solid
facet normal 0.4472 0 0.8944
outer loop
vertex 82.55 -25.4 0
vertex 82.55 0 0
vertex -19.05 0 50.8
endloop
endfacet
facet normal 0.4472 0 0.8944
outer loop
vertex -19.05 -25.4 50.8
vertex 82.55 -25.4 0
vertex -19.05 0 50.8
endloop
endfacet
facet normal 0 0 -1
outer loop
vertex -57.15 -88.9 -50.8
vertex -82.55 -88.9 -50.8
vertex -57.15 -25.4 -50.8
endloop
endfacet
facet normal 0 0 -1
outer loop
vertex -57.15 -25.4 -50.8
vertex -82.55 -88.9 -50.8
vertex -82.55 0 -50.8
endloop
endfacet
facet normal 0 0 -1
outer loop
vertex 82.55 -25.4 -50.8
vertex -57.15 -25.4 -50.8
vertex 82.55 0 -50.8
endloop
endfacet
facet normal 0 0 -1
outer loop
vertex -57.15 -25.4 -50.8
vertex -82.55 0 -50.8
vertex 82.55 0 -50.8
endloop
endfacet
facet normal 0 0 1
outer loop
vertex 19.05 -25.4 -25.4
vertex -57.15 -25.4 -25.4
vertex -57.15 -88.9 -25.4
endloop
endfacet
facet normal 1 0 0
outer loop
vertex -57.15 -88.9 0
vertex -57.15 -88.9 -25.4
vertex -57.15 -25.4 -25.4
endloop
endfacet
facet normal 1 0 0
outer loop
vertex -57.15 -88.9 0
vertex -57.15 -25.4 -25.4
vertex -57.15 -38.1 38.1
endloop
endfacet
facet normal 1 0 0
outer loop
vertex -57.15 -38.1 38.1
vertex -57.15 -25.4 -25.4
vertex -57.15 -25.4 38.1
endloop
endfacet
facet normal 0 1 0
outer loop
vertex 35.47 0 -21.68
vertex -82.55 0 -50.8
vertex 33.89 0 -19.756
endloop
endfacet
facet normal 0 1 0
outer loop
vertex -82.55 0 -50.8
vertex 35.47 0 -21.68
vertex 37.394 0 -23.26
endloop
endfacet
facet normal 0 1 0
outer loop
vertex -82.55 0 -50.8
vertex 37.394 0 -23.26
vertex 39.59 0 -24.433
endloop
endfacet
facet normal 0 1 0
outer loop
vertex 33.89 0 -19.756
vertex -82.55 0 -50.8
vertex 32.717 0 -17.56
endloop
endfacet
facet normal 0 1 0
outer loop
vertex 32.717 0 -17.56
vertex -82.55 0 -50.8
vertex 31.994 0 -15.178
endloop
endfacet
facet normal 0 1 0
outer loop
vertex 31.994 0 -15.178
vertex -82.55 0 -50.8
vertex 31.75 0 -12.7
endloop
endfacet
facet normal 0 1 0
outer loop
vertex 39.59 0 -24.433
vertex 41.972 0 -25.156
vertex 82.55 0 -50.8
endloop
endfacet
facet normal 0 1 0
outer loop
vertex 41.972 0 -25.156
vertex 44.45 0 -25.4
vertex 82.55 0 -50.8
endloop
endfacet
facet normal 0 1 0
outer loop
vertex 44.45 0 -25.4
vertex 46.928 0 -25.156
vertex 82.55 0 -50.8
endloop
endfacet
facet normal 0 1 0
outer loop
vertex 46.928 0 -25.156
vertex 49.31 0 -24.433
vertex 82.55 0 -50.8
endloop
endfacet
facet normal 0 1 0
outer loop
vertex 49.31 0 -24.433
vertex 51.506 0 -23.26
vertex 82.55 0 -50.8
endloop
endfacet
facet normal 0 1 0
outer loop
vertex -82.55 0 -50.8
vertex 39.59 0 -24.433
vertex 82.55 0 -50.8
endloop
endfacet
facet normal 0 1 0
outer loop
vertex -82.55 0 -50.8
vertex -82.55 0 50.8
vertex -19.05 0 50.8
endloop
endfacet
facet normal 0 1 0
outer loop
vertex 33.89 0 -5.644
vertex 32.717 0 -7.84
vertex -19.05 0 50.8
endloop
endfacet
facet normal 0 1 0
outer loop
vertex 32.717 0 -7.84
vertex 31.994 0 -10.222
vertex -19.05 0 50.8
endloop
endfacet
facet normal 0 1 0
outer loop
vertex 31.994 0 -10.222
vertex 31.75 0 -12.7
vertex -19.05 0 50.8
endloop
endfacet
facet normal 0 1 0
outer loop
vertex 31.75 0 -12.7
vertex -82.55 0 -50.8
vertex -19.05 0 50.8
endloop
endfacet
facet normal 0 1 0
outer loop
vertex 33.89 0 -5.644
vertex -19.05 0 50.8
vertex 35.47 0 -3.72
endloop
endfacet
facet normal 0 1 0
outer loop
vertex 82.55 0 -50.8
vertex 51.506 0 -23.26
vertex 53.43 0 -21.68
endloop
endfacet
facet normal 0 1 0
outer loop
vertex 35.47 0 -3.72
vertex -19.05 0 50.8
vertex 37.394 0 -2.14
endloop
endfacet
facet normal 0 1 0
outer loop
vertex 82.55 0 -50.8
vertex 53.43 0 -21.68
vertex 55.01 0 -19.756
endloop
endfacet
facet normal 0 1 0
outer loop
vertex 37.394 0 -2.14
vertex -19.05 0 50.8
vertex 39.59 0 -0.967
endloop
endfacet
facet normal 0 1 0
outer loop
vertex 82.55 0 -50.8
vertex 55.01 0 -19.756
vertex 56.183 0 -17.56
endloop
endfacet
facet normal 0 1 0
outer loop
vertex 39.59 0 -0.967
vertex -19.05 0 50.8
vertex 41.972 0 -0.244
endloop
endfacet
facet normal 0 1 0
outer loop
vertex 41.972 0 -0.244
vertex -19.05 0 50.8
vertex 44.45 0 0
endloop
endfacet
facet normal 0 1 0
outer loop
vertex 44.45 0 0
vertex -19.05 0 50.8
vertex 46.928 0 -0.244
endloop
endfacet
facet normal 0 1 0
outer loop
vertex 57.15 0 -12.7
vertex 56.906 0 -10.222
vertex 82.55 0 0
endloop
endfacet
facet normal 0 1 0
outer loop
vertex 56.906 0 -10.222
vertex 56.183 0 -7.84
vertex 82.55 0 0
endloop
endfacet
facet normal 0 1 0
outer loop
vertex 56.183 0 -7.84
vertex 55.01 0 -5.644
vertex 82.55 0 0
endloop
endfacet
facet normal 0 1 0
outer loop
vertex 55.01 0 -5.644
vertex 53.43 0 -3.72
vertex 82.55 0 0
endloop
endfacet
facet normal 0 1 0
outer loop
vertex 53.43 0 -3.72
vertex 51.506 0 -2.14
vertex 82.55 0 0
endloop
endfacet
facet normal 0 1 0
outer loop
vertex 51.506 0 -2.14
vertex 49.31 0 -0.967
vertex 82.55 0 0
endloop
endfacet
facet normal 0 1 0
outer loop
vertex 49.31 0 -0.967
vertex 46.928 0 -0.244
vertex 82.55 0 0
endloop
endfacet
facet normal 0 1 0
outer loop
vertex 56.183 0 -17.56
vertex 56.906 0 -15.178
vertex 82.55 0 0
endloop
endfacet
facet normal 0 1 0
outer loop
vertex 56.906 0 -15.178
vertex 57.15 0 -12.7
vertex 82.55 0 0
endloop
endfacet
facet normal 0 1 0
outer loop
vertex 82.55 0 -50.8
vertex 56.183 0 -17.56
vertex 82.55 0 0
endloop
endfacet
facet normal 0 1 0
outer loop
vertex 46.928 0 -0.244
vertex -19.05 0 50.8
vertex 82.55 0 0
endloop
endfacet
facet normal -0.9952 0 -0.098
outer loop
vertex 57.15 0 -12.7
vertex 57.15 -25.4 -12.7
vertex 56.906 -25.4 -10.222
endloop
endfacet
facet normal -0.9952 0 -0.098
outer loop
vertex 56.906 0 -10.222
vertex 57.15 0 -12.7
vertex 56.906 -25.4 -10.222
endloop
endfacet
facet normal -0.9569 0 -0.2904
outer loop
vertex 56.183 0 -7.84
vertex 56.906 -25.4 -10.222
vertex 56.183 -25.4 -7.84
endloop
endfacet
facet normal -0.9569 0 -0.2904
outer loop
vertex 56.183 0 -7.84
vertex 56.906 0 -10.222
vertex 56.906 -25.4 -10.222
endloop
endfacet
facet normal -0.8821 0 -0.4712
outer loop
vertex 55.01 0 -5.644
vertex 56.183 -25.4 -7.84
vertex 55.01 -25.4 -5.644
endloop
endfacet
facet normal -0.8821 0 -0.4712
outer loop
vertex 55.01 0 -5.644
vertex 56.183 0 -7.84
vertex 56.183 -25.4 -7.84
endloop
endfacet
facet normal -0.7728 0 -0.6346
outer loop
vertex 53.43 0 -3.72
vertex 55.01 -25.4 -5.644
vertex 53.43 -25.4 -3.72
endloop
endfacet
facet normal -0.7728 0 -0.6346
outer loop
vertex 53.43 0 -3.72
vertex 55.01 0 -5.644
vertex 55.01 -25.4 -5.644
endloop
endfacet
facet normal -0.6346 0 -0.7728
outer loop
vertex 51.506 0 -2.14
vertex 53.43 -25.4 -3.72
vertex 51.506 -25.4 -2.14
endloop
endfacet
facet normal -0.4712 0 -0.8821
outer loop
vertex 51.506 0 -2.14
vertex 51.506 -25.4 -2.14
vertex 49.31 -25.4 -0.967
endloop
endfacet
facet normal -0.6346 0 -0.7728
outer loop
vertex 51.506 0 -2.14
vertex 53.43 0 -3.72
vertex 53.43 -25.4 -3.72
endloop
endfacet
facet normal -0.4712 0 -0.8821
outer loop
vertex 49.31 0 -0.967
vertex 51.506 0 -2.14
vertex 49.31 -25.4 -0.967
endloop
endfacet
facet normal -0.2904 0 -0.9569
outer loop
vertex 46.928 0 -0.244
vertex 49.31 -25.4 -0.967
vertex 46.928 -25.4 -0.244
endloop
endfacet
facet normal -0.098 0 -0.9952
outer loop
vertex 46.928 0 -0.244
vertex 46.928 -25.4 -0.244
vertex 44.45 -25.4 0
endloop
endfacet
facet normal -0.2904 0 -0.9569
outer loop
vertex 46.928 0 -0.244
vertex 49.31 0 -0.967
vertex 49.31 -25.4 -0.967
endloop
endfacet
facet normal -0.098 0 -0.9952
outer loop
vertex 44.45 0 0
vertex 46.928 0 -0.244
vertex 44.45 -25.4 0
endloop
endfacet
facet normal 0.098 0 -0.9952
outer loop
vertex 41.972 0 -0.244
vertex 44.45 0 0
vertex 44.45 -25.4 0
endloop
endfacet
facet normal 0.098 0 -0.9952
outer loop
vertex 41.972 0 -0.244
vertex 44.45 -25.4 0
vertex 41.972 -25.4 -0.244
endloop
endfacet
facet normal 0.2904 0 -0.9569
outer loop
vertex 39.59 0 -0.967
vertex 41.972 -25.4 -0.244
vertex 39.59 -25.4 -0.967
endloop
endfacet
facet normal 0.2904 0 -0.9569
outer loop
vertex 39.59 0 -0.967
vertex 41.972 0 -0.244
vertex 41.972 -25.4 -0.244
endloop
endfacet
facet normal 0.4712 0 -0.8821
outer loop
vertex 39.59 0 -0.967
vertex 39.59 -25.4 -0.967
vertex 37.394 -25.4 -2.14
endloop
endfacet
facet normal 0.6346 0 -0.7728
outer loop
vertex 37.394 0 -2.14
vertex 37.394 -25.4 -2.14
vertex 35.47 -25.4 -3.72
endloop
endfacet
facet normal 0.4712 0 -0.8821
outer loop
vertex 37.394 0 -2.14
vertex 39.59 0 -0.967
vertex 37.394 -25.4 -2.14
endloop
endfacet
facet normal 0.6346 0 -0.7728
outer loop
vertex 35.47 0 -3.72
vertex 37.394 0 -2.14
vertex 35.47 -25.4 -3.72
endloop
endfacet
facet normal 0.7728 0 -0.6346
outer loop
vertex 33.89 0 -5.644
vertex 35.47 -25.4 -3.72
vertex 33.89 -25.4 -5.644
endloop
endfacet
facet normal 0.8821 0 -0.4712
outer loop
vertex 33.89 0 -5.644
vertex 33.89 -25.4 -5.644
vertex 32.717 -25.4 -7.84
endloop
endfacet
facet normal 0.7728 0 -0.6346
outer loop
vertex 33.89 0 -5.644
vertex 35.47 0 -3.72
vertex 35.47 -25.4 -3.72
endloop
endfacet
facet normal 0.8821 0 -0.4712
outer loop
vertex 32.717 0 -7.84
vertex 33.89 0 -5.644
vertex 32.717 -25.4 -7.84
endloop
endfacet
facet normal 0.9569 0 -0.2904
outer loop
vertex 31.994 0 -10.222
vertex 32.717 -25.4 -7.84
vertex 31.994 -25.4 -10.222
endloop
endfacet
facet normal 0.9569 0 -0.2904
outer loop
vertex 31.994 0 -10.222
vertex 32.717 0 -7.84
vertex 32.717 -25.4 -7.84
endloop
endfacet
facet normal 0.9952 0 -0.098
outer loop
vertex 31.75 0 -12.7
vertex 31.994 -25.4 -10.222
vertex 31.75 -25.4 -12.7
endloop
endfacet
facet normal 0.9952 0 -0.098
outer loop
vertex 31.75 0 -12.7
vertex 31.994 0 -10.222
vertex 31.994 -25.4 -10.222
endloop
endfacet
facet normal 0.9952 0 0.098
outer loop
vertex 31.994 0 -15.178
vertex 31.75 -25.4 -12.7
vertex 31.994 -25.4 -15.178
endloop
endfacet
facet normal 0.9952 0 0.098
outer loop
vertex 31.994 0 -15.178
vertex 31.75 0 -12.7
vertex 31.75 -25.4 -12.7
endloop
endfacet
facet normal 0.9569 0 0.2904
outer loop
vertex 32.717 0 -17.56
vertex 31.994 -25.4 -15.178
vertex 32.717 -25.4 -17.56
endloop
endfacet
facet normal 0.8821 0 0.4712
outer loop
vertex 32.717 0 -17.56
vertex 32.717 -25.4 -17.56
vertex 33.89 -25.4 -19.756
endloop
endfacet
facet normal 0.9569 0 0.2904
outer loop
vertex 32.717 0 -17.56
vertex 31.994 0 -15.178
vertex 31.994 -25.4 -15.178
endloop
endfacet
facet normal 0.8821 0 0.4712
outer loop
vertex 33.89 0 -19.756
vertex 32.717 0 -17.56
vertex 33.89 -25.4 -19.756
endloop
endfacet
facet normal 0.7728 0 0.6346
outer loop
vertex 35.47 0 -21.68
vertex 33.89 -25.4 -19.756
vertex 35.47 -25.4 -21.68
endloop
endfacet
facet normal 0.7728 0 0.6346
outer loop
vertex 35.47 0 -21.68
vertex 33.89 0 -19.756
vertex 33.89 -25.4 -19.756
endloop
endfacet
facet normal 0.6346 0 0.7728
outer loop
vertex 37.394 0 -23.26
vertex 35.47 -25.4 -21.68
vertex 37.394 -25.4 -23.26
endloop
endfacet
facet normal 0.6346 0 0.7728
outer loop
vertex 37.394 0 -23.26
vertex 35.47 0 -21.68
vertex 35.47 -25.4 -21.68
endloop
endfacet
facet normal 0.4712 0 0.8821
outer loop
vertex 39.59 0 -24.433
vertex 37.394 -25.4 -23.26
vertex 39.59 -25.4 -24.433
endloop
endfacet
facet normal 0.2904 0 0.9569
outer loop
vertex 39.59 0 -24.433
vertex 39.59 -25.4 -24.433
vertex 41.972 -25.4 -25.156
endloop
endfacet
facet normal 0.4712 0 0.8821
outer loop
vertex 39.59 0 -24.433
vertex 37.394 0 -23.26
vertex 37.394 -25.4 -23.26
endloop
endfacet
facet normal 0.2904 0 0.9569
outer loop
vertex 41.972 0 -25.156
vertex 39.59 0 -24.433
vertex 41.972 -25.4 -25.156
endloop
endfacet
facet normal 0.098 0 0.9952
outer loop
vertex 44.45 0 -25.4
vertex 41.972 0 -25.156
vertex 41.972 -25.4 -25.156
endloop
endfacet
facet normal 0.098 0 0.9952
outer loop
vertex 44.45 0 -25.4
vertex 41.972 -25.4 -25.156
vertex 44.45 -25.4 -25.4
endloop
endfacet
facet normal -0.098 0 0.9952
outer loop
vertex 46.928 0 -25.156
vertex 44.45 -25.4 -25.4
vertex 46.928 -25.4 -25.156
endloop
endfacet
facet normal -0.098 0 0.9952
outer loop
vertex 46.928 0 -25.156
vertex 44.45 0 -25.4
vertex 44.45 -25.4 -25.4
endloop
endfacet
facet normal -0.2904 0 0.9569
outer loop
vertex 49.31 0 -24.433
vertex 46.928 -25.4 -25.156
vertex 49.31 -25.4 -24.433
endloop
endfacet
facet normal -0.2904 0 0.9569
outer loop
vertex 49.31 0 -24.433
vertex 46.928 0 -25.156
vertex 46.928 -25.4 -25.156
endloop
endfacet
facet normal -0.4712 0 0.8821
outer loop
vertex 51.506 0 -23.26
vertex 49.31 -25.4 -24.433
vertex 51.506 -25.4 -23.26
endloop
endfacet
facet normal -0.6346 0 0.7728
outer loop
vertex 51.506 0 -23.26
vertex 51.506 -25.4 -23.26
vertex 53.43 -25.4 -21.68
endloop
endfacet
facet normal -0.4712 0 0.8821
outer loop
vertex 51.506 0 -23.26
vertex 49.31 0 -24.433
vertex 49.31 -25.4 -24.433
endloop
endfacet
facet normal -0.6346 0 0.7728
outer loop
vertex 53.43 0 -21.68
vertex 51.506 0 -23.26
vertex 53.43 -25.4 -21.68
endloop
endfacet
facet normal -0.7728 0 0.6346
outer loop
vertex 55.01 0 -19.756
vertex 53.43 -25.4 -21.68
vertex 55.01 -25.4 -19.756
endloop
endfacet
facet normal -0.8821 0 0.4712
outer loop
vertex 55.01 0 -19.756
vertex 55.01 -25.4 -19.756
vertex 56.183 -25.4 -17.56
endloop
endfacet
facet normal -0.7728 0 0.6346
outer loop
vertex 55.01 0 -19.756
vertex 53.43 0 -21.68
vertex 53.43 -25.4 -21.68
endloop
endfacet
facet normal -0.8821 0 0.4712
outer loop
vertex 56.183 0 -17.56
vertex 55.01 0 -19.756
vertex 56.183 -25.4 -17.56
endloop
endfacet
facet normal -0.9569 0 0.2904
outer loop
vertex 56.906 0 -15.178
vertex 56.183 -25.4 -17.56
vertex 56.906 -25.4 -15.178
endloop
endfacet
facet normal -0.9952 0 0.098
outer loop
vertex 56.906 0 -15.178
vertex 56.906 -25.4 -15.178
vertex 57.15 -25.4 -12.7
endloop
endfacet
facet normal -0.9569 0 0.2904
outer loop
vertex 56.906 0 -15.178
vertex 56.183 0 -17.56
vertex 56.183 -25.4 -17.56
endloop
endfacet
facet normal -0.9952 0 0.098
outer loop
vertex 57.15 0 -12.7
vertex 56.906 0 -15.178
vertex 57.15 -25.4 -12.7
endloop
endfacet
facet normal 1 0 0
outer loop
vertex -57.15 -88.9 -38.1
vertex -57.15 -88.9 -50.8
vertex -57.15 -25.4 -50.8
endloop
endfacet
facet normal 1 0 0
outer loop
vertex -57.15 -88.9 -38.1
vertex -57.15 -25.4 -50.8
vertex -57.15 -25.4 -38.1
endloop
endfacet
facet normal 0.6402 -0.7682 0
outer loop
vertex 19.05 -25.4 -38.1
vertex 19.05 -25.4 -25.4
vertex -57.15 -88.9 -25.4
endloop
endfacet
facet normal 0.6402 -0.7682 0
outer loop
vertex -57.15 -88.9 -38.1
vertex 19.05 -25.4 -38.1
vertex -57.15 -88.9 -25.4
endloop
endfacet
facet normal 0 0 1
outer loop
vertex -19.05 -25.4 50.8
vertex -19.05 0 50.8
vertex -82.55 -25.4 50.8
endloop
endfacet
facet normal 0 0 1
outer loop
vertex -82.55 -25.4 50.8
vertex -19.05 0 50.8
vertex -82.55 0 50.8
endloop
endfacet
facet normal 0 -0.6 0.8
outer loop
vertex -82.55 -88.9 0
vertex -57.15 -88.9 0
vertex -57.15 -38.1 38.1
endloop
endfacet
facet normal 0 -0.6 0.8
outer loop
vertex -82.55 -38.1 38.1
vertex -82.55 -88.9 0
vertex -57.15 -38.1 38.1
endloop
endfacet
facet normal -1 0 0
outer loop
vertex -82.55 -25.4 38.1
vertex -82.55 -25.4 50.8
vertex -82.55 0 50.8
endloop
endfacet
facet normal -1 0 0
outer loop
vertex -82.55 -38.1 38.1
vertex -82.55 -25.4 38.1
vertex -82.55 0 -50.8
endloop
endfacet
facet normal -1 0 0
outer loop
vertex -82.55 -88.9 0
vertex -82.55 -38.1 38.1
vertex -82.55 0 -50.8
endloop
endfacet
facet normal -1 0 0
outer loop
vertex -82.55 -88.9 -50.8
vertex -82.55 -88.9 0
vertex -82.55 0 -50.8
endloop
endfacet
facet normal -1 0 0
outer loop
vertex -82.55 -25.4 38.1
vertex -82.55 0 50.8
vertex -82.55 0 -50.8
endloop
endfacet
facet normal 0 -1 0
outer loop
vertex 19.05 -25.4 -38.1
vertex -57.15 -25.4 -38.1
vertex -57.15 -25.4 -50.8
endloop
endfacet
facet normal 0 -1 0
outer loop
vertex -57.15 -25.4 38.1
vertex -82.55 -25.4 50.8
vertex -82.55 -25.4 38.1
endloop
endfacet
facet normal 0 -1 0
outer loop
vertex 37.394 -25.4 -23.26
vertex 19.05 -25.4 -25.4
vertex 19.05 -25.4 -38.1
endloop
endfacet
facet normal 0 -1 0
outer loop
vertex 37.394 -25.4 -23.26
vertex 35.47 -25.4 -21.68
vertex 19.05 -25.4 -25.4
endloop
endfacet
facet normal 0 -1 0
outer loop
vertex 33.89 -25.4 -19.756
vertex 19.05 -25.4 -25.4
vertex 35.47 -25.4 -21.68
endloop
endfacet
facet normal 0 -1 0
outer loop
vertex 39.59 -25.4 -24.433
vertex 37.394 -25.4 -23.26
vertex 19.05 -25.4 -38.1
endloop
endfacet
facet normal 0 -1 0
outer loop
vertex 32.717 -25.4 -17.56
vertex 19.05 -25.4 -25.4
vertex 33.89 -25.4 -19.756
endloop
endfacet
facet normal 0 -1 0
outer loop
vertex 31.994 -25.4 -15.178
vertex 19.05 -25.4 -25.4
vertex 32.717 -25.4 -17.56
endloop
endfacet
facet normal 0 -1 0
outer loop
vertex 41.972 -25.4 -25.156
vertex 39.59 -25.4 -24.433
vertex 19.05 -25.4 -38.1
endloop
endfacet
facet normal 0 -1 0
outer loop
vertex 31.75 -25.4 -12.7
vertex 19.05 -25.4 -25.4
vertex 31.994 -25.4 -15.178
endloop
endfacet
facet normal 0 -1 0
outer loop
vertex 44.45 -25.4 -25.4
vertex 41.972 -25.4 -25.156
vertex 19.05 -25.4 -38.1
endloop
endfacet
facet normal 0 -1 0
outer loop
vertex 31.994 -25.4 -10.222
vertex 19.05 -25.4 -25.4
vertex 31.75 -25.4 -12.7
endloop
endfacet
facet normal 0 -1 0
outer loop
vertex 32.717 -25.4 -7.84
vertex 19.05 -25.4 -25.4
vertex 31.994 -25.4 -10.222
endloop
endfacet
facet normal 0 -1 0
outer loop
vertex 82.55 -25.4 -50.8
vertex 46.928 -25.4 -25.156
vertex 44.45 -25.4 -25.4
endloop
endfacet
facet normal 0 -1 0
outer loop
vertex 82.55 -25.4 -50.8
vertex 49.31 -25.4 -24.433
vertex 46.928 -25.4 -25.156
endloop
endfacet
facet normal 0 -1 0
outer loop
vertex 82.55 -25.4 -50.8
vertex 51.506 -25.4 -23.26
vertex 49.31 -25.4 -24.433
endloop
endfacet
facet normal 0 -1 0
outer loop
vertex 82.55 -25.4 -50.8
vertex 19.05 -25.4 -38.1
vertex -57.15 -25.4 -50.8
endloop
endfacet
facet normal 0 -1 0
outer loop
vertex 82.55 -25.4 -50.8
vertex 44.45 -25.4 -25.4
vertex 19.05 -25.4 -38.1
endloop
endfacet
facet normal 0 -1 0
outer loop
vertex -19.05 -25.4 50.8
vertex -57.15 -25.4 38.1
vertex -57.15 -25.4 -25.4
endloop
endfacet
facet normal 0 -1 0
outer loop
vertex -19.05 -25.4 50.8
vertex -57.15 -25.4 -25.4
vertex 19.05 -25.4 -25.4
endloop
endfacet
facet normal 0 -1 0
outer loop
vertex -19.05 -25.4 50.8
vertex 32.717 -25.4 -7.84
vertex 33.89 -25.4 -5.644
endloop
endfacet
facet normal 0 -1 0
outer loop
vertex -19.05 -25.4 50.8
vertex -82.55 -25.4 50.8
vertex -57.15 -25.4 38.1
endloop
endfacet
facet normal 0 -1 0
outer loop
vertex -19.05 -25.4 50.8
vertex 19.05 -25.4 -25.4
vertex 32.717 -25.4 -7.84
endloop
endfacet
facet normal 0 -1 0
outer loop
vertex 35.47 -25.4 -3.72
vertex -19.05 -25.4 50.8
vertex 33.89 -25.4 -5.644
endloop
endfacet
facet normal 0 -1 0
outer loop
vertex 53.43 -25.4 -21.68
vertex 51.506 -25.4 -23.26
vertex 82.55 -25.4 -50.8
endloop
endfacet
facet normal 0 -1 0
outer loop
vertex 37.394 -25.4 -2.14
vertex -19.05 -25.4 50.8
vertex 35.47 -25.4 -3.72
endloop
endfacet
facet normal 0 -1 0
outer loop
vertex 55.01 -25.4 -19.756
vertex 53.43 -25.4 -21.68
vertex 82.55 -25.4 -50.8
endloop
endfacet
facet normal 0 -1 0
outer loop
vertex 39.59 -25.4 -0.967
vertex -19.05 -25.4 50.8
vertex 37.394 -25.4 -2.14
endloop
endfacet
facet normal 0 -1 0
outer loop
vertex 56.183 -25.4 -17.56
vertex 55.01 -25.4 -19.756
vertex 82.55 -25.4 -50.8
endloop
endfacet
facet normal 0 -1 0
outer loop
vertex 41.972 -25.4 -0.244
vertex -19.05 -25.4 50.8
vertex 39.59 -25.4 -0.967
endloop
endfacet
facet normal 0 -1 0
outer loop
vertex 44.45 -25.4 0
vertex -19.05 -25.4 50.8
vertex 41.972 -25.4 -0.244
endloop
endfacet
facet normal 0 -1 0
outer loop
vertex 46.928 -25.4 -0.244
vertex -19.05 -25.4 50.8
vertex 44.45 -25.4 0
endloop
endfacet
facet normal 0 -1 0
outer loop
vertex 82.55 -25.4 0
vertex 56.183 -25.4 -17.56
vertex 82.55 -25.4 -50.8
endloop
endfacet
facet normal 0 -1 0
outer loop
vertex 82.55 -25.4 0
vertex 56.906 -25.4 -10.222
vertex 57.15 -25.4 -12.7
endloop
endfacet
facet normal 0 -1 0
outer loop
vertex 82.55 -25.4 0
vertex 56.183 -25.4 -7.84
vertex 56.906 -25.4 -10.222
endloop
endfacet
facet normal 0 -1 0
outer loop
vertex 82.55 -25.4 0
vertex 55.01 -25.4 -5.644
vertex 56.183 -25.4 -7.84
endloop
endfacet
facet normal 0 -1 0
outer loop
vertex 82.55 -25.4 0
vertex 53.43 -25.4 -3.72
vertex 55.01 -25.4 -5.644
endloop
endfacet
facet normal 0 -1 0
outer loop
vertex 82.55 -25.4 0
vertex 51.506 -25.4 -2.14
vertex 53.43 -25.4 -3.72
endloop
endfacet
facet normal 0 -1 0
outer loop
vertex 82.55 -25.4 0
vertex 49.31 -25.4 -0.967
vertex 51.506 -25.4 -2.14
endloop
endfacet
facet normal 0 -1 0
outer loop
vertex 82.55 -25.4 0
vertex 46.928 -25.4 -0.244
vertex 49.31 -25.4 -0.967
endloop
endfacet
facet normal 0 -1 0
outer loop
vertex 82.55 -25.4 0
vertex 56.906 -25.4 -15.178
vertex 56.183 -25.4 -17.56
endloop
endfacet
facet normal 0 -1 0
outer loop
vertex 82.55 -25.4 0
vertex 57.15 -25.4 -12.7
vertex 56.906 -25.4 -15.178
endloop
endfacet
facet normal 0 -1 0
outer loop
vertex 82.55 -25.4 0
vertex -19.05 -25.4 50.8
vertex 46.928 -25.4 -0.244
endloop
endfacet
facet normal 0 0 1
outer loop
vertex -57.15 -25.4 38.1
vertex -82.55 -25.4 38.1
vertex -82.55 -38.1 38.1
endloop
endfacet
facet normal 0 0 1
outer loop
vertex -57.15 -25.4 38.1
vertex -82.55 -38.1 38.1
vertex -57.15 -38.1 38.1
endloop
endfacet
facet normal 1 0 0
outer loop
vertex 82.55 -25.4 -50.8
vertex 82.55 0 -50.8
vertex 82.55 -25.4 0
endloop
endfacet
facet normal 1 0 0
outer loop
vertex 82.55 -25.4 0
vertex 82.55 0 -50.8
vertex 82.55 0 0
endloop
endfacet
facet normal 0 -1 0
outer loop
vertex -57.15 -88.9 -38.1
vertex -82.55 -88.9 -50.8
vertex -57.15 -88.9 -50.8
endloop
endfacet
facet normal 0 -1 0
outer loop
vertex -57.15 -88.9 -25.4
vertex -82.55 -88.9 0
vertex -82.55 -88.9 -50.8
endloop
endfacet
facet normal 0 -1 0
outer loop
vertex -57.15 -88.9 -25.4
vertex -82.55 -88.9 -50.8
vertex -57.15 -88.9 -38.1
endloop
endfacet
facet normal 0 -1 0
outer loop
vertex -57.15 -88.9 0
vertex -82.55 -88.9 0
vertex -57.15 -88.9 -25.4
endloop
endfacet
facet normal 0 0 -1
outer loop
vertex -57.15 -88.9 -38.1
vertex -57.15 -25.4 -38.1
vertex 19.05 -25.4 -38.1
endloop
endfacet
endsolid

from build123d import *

# Parameters (mm, degrees)
F0_W     = 76.2
F0_H     = 12.7
F0_W_2   = 25.4
F0_H_2   = 38.1
F1_DEPTH = 88.9
F0_R     = 12.7
F2_DEPTH = 25.4
F4_DEPTH = 25.4
F6_DEPTH = 25.4


with BuildPart() as f1:
    # F0 (on Front) → F1 (new body)
    with BuildSketch(Plane.XZ):
        with Locations((-19.05, -31.75)):
            Rectangle(F0_W, F0_H)
        Polygon((-82.55, -50.8), (-57.15, -50.8), (-57.15, -38.1), (-57.15, -25.4), (-57.15, 0), (-82.55, 0), align=None)
        with Locations((-69.85, 19.05)):
            Rectangle(F0_W_2, F0_H_2)
    extrude(amount=F1_DEPTH)

    # F0 (on Front) → F2 (join)
    with BuildSketch(Plane.XZ):
        Polygon((-82.55, -50.8), (-57.15, -50.8), (-57.15, -38.1), (-57.15, -25.4), (-57.15, 0), (-82.55, 0), align=None)
        Polygon((82.55, 0), (-19.05, 50.8), (-82.55, 50.8), (-82.55, 38.1), (-57.15, 38.1), (-57.15, 0), (-57.15, -25.4), (19.05, -25.4), (19.05, -38.1), (-57.15, -38.1), (-57.15, -50.8), (82.55, -50.8), align=None)
        with Locations((44.45, -12.7)):
            Circle(F0_R, mode=Mode.SUBTRACT)
    extrude(amount=F2_DEPTH)

    # F3 (on face) → F4 (cut)
    with BuildSketch(Plane.YZ.offset(-57.15)):
        Polygon((-88.9, 0), (-38.1, 38.1), (-88.9, 38.1), align=None)
    extrude(amount=-F4_DEPTH, mode=Mode.SUBTRACT)

    # F5 (on face) → F6 (cut)
    with BuildSketch(Plane.XY.offset(-25.4)):
        Polygon((19.05, -88.9), (19.05, -25.4), (-57.15, -88.9), align=None)
    extrude(amount=-F6_DEPTH, mode=Mode.SUBTRACT)


solid = f1.part
